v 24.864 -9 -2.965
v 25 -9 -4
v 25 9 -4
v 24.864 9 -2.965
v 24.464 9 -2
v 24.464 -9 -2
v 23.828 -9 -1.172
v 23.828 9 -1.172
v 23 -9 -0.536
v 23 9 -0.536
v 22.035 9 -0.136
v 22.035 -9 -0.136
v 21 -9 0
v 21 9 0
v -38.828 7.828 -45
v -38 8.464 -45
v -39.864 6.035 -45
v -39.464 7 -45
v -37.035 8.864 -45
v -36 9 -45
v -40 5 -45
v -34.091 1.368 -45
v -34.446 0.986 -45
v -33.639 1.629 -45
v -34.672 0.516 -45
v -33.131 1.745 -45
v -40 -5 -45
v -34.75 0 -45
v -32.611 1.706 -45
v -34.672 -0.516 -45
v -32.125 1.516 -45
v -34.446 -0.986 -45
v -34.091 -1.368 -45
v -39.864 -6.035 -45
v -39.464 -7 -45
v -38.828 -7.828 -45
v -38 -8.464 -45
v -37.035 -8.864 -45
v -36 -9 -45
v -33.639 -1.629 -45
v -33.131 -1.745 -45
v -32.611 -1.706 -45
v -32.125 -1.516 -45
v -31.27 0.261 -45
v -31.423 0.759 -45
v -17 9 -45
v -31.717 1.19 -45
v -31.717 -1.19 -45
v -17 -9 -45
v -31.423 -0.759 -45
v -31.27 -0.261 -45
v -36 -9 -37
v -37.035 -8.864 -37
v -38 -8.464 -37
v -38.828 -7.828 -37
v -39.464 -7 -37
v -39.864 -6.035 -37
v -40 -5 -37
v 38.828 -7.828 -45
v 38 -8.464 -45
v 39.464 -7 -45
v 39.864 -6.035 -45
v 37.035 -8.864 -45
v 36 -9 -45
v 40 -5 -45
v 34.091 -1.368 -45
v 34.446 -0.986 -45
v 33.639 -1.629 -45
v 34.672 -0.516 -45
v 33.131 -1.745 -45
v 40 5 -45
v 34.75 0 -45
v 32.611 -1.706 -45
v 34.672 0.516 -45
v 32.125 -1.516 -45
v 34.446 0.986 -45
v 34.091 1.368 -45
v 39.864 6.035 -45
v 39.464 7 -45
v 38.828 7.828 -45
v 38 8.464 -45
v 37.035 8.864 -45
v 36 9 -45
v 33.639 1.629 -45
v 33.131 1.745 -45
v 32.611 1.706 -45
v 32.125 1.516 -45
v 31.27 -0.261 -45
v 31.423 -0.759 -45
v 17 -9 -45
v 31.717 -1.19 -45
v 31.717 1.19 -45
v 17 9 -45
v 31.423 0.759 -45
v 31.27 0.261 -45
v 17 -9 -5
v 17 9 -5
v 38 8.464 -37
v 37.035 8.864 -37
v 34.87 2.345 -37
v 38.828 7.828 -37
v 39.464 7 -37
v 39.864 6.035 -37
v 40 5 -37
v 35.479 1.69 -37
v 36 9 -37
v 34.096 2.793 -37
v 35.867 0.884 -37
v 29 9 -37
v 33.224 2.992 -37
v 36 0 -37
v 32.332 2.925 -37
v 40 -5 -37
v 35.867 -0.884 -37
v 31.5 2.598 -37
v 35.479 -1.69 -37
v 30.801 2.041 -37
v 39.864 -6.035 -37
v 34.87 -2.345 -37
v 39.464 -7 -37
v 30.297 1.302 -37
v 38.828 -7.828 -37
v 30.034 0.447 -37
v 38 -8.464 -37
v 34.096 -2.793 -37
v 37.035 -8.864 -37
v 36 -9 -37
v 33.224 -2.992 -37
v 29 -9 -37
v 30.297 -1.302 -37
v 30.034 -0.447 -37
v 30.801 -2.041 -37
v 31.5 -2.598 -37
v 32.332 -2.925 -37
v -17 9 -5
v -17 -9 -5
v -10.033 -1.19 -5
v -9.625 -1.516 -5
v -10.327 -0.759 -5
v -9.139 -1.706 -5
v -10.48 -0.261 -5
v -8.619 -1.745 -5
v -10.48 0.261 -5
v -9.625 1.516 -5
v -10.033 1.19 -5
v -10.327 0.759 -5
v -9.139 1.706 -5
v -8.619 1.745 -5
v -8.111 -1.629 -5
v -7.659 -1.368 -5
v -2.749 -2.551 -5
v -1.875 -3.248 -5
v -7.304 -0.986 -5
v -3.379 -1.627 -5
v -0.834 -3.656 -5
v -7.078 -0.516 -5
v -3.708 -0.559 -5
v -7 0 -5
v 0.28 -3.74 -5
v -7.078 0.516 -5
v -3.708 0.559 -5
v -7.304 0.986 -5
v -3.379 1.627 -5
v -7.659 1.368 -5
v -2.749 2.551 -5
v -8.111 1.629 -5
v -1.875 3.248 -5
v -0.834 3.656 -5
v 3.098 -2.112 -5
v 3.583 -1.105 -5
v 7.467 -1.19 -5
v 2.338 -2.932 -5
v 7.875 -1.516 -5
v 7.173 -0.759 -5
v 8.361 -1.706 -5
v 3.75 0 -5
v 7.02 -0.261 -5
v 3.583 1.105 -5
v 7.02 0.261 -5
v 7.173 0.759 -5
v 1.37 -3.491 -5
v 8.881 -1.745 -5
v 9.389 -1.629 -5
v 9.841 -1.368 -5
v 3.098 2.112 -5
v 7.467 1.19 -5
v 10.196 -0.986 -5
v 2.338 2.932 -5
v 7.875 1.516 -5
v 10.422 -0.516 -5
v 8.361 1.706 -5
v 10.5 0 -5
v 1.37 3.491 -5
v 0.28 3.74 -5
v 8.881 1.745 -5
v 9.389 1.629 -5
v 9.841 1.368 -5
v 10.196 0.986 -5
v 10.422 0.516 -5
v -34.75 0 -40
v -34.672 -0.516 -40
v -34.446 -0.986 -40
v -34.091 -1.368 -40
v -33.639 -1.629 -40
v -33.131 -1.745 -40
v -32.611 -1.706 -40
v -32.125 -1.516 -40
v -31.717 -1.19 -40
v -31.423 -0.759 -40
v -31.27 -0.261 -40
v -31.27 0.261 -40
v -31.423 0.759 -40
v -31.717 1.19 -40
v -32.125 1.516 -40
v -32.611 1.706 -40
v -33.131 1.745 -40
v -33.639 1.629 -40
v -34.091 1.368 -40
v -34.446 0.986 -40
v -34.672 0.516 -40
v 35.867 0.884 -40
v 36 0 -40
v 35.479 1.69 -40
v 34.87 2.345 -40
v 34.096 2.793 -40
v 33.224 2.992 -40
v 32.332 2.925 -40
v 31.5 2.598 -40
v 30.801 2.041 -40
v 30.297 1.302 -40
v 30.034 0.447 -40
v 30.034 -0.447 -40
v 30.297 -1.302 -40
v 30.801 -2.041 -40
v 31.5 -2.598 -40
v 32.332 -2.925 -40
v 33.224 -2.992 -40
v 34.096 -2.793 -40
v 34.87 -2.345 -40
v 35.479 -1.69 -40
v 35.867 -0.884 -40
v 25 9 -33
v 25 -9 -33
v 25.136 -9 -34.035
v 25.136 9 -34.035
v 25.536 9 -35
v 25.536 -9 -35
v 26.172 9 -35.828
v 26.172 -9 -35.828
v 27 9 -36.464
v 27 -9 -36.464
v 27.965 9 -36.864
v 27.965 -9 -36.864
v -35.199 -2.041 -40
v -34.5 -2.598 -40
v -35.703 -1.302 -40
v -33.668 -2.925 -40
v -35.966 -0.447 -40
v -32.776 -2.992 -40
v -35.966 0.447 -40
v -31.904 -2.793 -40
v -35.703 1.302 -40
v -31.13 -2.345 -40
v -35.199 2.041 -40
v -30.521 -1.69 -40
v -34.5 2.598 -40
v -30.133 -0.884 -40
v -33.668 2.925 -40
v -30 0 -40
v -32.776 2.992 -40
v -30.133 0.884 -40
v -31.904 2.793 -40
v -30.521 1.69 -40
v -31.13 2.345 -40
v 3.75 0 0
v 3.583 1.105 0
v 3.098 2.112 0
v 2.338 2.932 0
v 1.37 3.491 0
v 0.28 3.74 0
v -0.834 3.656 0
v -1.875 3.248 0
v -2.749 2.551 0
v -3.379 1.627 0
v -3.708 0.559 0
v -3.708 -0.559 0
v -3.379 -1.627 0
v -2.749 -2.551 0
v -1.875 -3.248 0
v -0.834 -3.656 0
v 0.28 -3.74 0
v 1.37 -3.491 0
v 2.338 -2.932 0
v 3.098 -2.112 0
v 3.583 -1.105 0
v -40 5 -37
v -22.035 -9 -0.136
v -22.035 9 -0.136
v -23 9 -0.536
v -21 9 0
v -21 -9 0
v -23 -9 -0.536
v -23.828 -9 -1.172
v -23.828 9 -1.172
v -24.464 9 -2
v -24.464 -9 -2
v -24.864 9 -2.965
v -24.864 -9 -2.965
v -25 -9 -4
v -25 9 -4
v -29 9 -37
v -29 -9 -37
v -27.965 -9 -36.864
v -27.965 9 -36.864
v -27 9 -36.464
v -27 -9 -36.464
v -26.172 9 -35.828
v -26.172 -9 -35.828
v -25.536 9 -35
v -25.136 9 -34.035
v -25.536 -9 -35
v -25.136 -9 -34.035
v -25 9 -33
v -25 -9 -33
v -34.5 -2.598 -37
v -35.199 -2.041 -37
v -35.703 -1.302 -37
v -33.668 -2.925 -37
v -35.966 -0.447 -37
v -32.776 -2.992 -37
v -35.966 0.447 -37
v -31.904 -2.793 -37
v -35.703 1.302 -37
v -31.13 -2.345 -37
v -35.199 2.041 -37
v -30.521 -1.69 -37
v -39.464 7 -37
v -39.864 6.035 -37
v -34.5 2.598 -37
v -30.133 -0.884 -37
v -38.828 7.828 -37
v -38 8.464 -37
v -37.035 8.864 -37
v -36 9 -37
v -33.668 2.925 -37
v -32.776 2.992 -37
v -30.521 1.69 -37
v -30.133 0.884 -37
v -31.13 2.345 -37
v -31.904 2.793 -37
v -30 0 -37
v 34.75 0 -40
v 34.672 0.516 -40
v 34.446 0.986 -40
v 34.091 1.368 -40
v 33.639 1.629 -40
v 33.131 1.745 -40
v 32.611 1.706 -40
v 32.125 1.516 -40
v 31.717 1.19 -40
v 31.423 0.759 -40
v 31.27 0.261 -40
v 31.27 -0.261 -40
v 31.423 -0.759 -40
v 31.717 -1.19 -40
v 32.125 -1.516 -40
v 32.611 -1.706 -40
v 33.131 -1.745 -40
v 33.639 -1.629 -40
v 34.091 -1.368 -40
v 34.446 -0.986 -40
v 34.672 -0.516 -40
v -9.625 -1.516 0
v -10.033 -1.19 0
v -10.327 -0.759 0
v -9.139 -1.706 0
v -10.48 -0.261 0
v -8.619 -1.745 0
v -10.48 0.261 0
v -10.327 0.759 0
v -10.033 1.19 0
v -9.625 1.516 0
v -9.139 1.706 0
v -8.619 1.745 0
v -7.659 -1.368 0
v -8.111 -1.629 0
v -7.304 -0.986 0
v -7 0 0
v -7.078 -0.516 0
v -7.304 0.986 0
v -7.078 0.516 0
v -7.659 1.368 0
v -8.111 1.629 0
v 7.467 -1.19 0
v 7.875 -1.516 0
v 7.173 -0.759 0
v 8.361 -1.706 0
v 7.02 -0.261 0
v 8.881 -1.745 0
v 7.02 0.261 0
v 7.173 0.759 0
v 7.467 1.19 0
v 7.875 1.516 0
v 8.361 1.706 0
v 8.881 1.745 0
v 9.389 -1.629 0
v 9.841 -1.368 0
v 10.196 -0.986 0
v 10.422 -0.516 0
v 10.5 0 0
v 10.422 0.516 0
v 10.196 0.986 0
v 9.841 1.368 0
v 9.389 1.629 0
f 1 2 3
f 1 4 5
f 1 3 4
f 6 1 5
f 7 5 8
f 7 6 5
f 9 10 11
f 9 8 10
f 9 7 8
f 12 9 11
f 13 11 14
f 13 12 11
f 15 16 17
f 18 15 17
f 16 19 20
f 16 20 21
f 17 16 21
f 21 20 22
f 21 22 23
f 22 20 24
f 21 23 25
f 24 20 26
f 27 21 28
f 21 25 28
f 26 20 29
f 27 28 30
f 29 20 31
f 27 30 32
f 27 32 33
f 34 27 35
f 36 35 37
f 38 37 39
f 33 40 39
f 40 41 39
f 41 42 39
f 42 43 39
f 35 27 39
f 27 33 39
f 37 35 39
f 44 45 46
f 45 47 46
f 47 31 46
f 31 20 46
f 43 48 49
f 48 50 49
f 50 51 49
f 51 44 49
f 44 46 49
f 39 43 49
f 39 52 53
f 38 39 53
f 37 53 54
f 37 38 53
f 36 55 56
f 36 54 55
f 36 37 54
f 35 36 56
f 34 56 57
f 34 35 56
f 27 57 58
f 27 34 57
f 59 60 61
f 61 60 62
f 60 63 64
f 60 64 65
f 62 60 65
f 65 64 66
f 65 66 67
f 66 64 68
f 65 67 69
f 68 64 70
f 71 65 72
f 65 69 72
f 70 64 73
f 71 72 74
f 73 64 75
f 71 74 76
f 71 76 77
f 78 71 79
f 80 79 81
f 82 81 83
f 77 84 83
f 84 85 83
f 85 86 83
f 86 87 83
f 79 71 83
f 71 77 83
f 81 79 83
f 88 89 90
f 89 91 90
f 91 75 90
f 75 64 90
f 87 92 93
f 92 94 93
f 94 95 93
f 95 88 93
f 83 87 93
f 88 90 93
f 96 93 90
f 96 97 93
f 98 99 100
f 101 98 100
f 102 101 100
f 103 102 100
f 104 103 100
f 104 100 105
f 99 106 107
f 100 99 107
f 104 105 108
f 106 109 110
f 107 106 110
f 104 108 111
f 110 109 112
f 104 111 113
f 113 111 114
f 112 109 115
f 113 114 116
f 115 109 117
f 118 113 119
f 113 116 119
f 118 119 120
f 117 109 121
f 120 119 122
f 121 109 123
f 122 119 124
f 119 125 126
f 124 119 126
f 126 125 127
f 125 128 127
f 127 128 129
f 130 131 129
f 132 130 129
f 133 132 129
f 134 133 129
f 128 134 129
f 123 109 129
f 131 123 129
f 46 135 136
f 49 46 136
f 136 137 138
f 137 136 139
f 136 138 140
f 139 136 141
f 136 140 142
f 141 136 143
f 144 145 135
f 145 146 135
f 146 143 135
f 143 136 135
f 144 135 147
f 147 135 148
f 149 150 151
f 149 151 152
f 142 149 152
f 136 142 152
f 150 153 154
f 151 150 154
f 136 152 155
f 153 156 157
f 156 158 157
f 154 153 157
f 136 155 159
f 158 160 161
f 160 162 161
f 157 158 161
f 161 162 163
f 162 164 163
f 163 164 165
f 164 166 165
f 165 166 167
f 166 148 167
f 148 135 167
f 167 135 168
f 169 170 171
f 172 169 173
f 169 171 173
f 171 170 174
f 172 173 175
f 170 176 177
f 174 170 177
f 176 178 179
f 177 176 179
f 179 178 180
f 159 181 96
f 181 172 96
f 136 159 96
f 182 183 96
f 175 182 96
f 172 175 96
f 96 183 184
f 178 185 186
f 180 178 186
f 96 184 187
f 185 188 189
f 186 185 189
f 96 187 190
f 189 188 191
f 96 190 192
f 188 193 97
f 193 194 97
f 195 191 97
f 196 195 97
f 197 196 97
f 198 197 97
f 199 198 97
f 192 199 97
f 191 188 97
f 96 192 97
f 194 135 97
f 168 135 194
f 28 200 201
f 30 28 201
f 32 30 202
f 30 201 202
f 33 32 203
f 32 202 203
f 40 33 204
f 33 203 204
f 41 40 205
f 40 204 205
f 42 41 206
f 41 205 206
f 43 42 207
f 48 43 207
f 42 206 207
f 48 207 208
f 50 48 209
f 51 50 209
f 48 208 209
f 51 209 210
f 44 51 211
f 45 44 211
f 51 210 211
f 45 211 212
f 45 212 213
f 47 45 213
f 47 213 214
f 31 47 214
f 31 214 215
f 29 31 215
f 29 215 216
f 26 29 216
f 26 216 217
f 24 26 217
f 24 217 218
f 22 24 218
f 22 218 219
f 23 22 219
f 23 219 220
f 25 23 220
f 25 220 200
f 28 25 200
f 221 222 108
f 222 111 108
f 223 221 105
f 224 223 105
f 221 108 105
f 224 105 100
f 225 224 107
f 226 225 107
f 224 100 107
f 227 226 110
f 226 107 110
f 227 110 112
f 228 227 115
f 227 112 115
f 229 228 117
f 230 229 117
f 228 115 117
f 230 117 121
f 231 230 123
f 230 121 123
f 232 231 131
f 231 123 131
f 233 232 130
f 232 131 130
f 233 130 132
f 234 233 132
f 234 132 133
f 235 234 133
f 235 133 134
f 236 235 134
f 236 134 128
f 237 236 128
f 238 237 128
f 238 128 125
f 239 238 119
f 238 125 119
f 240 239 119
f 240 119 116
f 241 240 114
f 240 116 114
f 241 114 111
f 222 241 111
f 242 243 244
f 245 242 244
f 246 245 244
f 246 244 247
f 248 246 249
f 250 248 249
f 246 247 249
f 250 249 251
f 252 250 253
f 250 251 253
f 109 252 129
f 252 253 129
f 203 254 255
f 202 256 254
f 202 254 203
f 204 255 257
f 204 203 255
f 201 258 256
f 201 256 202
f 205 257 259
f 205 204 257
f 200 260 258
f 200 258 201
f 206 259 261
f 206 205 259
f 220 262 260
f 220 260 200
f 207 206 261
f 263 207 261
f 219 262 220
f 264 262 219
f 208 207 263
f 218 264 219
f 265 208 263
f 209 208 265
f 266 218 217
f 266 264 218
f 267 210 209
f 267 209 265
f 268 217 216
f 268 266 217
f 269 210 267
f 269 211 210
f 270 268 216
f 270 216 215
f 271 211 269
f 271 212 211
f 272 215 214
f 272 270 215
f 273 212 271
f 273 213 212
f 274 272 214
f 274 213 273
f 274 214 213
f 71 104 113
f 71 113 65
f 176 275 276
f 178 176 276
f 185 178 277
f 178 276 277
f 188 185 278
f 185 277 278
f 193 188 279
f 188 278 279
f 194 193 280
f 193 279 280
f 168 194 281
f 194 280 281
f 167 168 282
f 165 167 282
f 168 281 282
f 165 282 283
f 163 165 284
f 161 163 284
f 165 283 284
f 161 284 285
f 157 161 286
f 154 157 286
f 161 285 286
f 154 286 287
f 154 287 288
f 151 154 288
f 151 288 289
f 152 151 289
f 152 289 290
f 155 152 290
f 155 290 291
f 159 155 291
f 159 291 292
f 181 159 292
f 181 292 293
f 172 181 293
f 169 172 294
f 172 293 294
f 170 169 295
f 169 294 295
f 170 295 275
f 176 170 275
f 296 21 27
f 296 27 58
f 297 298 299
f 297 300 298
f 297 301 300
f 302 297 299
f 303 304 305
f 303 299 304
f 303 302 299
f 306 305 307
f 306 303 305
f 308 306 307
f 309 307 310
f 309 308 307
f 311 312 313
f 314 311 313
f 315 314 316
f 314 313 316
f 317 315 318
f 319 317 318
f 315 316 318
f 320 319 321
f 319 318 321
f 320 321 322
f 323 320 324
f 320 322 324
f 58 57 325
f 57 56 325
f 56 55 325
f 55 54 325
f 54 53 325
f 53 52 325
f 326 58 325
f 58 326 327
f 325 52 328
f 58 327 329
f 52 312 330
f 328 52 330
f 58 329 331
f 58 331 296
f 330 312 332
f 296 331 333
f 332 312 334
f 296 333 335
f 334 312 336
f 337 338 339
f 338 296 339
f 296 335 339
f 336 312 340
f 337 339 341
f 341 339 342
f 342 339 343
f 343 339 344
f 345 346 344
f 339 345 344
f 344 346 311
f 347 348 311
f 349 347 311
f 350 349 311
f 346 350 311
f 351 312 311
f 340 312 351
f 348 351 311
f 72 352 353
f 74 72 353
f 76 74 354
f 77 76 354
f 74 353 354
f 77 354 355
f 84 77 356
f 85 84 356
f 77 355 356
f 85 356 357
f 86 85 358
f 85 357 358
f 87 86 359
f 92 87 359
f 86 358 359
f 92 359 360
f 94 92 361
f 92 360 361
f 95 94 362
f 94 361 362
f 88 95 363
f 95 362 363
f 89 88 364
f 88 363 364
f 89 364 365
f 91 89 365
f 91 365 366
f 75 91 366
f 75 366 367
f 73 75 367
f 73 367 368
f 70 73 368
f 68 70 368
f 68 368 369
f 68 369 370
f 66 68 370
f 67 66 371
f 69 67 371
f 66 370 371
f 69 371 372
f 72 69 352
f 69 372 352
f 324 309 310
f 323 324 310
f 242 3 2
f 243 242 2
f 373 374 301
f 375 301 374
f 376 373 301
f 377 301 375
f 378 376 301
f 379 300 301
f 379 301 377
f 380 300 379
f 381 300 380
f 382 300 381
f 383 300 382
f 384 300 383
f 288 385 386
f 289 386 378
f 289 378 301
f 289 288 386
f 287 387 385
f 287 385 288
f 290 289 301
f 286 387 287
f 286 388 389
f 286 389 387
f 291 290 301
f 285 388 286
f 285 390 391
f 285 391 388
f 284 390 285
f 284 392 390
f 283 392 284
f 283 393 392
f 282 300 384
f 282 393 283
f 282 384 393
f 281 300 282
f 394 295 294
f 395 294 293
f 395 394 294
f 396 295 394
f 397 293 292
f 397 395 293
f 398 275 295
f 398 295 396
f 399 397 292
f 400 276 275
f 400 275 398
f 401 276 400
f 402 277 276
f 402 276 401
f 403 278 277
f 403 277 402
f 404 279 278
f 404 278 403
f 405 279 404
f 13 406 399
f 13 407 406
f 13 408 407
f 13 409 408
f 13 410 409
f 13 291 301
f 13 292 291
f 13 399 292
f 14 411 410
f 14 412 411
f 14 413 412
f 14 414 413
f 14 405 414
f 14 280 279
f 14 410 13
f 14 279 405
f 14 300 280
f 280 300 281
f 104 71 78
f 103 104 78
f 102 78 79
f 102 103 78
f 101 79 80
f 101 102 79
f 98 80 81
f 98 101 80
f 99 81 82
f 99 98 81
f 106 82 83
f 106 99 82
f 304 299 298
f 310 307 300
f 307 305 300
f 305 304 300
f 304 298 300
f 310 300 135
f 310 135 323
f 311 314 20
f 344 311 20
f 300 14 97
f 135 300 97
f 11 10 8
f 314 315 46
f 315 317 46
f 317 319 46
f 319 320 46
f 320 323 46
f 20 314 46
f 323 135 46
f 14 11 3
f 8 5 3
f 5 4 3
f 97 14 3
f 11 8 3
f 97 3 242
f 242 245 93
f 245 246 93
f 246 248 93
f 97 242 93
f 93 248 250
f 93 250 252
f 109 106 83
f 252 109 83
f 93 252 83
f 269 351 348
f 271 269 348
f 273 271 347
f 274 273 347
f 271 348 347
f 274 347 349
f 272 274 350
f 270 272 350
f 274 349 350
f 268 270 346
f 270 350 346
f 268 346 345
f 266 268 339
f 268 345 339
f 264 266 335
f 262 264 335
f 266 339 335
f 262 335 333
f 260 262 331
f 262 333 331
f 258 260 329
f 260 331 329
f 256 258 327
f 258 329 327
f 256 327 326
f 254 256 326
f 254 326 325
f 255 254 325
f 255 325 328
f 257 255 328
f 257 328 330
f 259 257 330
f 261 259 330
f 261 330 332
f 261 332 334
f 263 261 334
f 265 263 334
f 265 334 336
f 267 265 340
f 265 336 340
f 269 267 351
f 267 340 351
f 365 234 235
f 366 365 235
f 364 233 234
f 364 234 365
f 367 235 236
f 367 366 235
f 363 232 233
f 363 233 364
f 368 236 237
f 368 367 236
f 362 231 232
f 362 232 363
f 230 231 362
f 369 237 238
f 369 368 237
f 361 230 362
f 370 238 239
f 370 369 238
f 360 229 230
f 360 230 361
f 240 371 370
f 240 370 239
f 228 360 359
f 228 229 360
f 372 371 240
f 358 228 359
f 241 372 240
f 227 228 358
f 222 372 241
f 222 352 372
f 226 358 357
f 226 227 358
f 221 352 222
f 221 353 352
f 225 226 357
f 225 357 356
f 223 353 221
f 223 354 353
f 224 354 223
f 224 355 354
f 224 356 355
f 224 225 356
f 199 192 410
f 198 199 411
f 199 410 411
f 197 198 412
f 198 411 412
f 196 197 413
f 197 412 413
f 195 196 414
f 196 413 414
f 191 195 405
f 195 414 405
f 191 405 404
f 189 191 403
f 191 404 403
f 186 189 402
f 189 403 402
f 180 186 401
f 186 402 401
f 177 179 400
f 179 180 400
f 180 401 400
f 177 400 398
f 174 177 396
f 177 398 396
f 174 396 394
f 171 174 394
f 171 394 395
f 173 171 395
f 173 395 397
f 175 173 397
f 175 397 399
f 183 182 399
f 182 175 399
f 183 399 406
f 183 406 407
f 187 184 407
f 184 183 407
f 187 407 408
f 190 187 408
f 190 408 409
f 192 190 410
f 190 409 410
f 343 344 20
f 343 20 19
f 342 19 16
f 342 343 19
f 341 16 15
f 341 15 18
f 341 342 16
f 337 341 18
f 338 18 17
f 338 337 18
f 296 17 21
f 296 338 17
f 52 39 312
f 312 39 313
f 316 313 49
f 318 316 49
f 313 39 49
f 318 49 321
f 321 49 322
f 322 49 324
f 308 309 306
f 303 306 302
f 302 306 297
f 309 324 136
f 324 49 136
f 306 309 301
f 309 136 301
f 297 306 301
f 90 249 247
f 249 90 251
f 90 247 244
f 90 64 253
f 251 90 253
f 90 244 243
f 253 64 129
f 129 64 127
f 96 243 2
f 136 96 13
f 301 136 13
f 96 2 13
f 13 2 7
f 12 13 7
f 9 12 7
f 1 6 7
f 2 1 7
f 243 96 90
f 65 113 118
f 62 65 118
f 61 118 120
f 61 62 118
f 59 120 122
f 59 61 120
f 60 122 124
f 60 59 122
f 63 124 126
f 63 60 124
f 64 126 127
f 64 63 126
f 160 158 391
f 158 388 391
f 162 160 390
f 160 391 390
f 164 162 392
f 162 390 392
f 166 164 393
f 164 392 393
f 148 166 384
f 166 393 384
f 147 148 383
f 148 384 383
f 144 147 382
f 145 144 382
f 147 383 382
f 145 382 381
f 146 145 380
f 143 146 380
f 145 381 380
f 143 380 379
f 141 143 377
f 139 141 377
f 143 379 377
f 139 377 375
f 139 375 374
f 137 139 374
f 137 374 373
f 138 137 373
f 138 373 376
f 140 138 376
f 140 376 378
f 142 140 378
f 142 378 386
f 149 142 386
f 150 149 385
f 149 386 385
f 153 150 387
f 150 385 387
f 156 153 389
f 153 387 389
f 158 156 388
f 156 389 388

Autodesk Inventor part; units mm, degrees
ref_plane "YZ Plane" through (0, 0, 0) normal (1, 0, 0) x (0, 1, 0)
ref_plane "XZ Plane" through (0, 0, 0) normal (0, 1, 0) x (-1, 0, 0)
ref_plane "XY Plane" through (0, 0, 0) normal (0, 0, 1) x (1, 0, 0)
sketch "Sketch1" plane through (0, 0, 0) normal (0, 0, 1) x (1, 0, 0)
  circle A0 centre (0, 0) radius 3.75
  circle A1 centre (-8.75, 0) radius 1.75
  line L0 (-35, 0) -> (35, 0) projected
  line L1 (0, 0) -> (0, 3.75)
  circle A2 centre (8.75, 0) radius 1.75
  line L2 (-25, 9) -> (25, 9)
  line L3 (25, 9) -> (25, -9)
  line L4 (25, -9) -> (-25, -9)
  line L5 (-25, -9) -> (-25, 9)
  line L6 (0, -12.6) -> (0, 12.6) projected
  line L7 (25, 9) -> (17, 9)
  line L8 (17, 9) -> (17, -9)
  line L9 (17, -9) -> (25, -9)
  line L10 (25, -9) -> (25, 9)
  line L11 (-25, 9) -> (-25, -9)
  line L12 (-25, 9) -> (-17, 9)
  line L13 (-17, 9) -> (-17, -9)
  line L14 (-17, -9) -> (-25, -9)
  point P0 (0, 9)
  point P1 (25, 0)
  point P2 (-17, -9)
  point P3 (17, 9)
  point P4 (-17, 9)
  dimension "d2" = 7.5
  dimension "d3" = 3.5
  dimension "d4" = 8.75
  dimension "d5" = 18
  dimension "d6" = 50
  dimension "d9" = 8
extrude "Extrusion1" add sketch "Sketch1" against normal blind 5 contours L0 A2 L8 L4 L6 A0 | A0 L6 L2 L8 L0 A2 | A0 L0 A1 L13 L2 L6 | L6 L4 L13 L0 A1 A0
extrude "Extrusion2" add sketch "Sketch1" against normal blind 45 contours L13 L0 L5 L2 | L2 L3 L0 L8 | L8 L0 L3 L4 | L4 L5 L0 L13
sketch "Sketch2" plane through (25, -9, 0) normal (1, 0, 0) x (0, 0, -1)
  line L0 (5, 0) -> (45, 0) projected
  line L1 (37, 0) -> (45, 0)
  line L2 (45, 0) -> (45, 18)
  line L3 (45, 18) -> (37, 18)
  line L4 (37, 18) -> (37, 0)
  point P0 (0, 9)
  dimension "d12" = 8
extrude "Extrusion3" add sketch "Sketch2" along normal blind 15
sketch "Sketch3" plane through (25, -9, -37) normal (0, 0, 1) x (1, 0, 0)
  circle A0 centre (8, 9) radius 1.75
  line L0 (-63, 9) -> (28, 9) projected
  line L1 (0, 0) -> (0, 18) projected
  point P0 (-25, 9)
  dimension "d15" = 3.5
  dimension "d16" = 8
extrude "Extrusion4" cut sketch "Sketch3" against normal blind 15
mirror "Mirror1" about plane through (0, 0, 0) normal (1, 0, 0) of "Extrusion3", "Extrusion4"
sketch "Sketch4" plane through (0, 0, -45) normal (0, 0, -1) x (-1, 0, 0)
  point P0 (0, 0)
sketch "Sketch5" plane through (25, -9, -37) normal (0, 0, 1) x (1, 0, 0)
  circle A0 centre (8, 9) radius 1.75 projected
  circle A1 centre (8, 9) radius 3
  circle A2 centre (-33.75, 9) radius 1.75 projected
  circle A3 centre (-58, 9) radius 1.75 projected
  circle A4 centre (-58, 9) radius 3
  point P0 (-25, 9)
  dimension "d19" = 6
extrude "Extrusion5" cut sketch "Sketch5" against normal blind 3 contours A1 | A4
fillet "Fillet1" radius 4 8 edges at (25, 0, -37) (25, 0, 0) (-25, 0, 0) (-25, 0, -37) (-40, -9, -41) (-40, 9, -41) (40, -9, -41) (40, 9, -41)
properties part number "Motor _Fixation"
